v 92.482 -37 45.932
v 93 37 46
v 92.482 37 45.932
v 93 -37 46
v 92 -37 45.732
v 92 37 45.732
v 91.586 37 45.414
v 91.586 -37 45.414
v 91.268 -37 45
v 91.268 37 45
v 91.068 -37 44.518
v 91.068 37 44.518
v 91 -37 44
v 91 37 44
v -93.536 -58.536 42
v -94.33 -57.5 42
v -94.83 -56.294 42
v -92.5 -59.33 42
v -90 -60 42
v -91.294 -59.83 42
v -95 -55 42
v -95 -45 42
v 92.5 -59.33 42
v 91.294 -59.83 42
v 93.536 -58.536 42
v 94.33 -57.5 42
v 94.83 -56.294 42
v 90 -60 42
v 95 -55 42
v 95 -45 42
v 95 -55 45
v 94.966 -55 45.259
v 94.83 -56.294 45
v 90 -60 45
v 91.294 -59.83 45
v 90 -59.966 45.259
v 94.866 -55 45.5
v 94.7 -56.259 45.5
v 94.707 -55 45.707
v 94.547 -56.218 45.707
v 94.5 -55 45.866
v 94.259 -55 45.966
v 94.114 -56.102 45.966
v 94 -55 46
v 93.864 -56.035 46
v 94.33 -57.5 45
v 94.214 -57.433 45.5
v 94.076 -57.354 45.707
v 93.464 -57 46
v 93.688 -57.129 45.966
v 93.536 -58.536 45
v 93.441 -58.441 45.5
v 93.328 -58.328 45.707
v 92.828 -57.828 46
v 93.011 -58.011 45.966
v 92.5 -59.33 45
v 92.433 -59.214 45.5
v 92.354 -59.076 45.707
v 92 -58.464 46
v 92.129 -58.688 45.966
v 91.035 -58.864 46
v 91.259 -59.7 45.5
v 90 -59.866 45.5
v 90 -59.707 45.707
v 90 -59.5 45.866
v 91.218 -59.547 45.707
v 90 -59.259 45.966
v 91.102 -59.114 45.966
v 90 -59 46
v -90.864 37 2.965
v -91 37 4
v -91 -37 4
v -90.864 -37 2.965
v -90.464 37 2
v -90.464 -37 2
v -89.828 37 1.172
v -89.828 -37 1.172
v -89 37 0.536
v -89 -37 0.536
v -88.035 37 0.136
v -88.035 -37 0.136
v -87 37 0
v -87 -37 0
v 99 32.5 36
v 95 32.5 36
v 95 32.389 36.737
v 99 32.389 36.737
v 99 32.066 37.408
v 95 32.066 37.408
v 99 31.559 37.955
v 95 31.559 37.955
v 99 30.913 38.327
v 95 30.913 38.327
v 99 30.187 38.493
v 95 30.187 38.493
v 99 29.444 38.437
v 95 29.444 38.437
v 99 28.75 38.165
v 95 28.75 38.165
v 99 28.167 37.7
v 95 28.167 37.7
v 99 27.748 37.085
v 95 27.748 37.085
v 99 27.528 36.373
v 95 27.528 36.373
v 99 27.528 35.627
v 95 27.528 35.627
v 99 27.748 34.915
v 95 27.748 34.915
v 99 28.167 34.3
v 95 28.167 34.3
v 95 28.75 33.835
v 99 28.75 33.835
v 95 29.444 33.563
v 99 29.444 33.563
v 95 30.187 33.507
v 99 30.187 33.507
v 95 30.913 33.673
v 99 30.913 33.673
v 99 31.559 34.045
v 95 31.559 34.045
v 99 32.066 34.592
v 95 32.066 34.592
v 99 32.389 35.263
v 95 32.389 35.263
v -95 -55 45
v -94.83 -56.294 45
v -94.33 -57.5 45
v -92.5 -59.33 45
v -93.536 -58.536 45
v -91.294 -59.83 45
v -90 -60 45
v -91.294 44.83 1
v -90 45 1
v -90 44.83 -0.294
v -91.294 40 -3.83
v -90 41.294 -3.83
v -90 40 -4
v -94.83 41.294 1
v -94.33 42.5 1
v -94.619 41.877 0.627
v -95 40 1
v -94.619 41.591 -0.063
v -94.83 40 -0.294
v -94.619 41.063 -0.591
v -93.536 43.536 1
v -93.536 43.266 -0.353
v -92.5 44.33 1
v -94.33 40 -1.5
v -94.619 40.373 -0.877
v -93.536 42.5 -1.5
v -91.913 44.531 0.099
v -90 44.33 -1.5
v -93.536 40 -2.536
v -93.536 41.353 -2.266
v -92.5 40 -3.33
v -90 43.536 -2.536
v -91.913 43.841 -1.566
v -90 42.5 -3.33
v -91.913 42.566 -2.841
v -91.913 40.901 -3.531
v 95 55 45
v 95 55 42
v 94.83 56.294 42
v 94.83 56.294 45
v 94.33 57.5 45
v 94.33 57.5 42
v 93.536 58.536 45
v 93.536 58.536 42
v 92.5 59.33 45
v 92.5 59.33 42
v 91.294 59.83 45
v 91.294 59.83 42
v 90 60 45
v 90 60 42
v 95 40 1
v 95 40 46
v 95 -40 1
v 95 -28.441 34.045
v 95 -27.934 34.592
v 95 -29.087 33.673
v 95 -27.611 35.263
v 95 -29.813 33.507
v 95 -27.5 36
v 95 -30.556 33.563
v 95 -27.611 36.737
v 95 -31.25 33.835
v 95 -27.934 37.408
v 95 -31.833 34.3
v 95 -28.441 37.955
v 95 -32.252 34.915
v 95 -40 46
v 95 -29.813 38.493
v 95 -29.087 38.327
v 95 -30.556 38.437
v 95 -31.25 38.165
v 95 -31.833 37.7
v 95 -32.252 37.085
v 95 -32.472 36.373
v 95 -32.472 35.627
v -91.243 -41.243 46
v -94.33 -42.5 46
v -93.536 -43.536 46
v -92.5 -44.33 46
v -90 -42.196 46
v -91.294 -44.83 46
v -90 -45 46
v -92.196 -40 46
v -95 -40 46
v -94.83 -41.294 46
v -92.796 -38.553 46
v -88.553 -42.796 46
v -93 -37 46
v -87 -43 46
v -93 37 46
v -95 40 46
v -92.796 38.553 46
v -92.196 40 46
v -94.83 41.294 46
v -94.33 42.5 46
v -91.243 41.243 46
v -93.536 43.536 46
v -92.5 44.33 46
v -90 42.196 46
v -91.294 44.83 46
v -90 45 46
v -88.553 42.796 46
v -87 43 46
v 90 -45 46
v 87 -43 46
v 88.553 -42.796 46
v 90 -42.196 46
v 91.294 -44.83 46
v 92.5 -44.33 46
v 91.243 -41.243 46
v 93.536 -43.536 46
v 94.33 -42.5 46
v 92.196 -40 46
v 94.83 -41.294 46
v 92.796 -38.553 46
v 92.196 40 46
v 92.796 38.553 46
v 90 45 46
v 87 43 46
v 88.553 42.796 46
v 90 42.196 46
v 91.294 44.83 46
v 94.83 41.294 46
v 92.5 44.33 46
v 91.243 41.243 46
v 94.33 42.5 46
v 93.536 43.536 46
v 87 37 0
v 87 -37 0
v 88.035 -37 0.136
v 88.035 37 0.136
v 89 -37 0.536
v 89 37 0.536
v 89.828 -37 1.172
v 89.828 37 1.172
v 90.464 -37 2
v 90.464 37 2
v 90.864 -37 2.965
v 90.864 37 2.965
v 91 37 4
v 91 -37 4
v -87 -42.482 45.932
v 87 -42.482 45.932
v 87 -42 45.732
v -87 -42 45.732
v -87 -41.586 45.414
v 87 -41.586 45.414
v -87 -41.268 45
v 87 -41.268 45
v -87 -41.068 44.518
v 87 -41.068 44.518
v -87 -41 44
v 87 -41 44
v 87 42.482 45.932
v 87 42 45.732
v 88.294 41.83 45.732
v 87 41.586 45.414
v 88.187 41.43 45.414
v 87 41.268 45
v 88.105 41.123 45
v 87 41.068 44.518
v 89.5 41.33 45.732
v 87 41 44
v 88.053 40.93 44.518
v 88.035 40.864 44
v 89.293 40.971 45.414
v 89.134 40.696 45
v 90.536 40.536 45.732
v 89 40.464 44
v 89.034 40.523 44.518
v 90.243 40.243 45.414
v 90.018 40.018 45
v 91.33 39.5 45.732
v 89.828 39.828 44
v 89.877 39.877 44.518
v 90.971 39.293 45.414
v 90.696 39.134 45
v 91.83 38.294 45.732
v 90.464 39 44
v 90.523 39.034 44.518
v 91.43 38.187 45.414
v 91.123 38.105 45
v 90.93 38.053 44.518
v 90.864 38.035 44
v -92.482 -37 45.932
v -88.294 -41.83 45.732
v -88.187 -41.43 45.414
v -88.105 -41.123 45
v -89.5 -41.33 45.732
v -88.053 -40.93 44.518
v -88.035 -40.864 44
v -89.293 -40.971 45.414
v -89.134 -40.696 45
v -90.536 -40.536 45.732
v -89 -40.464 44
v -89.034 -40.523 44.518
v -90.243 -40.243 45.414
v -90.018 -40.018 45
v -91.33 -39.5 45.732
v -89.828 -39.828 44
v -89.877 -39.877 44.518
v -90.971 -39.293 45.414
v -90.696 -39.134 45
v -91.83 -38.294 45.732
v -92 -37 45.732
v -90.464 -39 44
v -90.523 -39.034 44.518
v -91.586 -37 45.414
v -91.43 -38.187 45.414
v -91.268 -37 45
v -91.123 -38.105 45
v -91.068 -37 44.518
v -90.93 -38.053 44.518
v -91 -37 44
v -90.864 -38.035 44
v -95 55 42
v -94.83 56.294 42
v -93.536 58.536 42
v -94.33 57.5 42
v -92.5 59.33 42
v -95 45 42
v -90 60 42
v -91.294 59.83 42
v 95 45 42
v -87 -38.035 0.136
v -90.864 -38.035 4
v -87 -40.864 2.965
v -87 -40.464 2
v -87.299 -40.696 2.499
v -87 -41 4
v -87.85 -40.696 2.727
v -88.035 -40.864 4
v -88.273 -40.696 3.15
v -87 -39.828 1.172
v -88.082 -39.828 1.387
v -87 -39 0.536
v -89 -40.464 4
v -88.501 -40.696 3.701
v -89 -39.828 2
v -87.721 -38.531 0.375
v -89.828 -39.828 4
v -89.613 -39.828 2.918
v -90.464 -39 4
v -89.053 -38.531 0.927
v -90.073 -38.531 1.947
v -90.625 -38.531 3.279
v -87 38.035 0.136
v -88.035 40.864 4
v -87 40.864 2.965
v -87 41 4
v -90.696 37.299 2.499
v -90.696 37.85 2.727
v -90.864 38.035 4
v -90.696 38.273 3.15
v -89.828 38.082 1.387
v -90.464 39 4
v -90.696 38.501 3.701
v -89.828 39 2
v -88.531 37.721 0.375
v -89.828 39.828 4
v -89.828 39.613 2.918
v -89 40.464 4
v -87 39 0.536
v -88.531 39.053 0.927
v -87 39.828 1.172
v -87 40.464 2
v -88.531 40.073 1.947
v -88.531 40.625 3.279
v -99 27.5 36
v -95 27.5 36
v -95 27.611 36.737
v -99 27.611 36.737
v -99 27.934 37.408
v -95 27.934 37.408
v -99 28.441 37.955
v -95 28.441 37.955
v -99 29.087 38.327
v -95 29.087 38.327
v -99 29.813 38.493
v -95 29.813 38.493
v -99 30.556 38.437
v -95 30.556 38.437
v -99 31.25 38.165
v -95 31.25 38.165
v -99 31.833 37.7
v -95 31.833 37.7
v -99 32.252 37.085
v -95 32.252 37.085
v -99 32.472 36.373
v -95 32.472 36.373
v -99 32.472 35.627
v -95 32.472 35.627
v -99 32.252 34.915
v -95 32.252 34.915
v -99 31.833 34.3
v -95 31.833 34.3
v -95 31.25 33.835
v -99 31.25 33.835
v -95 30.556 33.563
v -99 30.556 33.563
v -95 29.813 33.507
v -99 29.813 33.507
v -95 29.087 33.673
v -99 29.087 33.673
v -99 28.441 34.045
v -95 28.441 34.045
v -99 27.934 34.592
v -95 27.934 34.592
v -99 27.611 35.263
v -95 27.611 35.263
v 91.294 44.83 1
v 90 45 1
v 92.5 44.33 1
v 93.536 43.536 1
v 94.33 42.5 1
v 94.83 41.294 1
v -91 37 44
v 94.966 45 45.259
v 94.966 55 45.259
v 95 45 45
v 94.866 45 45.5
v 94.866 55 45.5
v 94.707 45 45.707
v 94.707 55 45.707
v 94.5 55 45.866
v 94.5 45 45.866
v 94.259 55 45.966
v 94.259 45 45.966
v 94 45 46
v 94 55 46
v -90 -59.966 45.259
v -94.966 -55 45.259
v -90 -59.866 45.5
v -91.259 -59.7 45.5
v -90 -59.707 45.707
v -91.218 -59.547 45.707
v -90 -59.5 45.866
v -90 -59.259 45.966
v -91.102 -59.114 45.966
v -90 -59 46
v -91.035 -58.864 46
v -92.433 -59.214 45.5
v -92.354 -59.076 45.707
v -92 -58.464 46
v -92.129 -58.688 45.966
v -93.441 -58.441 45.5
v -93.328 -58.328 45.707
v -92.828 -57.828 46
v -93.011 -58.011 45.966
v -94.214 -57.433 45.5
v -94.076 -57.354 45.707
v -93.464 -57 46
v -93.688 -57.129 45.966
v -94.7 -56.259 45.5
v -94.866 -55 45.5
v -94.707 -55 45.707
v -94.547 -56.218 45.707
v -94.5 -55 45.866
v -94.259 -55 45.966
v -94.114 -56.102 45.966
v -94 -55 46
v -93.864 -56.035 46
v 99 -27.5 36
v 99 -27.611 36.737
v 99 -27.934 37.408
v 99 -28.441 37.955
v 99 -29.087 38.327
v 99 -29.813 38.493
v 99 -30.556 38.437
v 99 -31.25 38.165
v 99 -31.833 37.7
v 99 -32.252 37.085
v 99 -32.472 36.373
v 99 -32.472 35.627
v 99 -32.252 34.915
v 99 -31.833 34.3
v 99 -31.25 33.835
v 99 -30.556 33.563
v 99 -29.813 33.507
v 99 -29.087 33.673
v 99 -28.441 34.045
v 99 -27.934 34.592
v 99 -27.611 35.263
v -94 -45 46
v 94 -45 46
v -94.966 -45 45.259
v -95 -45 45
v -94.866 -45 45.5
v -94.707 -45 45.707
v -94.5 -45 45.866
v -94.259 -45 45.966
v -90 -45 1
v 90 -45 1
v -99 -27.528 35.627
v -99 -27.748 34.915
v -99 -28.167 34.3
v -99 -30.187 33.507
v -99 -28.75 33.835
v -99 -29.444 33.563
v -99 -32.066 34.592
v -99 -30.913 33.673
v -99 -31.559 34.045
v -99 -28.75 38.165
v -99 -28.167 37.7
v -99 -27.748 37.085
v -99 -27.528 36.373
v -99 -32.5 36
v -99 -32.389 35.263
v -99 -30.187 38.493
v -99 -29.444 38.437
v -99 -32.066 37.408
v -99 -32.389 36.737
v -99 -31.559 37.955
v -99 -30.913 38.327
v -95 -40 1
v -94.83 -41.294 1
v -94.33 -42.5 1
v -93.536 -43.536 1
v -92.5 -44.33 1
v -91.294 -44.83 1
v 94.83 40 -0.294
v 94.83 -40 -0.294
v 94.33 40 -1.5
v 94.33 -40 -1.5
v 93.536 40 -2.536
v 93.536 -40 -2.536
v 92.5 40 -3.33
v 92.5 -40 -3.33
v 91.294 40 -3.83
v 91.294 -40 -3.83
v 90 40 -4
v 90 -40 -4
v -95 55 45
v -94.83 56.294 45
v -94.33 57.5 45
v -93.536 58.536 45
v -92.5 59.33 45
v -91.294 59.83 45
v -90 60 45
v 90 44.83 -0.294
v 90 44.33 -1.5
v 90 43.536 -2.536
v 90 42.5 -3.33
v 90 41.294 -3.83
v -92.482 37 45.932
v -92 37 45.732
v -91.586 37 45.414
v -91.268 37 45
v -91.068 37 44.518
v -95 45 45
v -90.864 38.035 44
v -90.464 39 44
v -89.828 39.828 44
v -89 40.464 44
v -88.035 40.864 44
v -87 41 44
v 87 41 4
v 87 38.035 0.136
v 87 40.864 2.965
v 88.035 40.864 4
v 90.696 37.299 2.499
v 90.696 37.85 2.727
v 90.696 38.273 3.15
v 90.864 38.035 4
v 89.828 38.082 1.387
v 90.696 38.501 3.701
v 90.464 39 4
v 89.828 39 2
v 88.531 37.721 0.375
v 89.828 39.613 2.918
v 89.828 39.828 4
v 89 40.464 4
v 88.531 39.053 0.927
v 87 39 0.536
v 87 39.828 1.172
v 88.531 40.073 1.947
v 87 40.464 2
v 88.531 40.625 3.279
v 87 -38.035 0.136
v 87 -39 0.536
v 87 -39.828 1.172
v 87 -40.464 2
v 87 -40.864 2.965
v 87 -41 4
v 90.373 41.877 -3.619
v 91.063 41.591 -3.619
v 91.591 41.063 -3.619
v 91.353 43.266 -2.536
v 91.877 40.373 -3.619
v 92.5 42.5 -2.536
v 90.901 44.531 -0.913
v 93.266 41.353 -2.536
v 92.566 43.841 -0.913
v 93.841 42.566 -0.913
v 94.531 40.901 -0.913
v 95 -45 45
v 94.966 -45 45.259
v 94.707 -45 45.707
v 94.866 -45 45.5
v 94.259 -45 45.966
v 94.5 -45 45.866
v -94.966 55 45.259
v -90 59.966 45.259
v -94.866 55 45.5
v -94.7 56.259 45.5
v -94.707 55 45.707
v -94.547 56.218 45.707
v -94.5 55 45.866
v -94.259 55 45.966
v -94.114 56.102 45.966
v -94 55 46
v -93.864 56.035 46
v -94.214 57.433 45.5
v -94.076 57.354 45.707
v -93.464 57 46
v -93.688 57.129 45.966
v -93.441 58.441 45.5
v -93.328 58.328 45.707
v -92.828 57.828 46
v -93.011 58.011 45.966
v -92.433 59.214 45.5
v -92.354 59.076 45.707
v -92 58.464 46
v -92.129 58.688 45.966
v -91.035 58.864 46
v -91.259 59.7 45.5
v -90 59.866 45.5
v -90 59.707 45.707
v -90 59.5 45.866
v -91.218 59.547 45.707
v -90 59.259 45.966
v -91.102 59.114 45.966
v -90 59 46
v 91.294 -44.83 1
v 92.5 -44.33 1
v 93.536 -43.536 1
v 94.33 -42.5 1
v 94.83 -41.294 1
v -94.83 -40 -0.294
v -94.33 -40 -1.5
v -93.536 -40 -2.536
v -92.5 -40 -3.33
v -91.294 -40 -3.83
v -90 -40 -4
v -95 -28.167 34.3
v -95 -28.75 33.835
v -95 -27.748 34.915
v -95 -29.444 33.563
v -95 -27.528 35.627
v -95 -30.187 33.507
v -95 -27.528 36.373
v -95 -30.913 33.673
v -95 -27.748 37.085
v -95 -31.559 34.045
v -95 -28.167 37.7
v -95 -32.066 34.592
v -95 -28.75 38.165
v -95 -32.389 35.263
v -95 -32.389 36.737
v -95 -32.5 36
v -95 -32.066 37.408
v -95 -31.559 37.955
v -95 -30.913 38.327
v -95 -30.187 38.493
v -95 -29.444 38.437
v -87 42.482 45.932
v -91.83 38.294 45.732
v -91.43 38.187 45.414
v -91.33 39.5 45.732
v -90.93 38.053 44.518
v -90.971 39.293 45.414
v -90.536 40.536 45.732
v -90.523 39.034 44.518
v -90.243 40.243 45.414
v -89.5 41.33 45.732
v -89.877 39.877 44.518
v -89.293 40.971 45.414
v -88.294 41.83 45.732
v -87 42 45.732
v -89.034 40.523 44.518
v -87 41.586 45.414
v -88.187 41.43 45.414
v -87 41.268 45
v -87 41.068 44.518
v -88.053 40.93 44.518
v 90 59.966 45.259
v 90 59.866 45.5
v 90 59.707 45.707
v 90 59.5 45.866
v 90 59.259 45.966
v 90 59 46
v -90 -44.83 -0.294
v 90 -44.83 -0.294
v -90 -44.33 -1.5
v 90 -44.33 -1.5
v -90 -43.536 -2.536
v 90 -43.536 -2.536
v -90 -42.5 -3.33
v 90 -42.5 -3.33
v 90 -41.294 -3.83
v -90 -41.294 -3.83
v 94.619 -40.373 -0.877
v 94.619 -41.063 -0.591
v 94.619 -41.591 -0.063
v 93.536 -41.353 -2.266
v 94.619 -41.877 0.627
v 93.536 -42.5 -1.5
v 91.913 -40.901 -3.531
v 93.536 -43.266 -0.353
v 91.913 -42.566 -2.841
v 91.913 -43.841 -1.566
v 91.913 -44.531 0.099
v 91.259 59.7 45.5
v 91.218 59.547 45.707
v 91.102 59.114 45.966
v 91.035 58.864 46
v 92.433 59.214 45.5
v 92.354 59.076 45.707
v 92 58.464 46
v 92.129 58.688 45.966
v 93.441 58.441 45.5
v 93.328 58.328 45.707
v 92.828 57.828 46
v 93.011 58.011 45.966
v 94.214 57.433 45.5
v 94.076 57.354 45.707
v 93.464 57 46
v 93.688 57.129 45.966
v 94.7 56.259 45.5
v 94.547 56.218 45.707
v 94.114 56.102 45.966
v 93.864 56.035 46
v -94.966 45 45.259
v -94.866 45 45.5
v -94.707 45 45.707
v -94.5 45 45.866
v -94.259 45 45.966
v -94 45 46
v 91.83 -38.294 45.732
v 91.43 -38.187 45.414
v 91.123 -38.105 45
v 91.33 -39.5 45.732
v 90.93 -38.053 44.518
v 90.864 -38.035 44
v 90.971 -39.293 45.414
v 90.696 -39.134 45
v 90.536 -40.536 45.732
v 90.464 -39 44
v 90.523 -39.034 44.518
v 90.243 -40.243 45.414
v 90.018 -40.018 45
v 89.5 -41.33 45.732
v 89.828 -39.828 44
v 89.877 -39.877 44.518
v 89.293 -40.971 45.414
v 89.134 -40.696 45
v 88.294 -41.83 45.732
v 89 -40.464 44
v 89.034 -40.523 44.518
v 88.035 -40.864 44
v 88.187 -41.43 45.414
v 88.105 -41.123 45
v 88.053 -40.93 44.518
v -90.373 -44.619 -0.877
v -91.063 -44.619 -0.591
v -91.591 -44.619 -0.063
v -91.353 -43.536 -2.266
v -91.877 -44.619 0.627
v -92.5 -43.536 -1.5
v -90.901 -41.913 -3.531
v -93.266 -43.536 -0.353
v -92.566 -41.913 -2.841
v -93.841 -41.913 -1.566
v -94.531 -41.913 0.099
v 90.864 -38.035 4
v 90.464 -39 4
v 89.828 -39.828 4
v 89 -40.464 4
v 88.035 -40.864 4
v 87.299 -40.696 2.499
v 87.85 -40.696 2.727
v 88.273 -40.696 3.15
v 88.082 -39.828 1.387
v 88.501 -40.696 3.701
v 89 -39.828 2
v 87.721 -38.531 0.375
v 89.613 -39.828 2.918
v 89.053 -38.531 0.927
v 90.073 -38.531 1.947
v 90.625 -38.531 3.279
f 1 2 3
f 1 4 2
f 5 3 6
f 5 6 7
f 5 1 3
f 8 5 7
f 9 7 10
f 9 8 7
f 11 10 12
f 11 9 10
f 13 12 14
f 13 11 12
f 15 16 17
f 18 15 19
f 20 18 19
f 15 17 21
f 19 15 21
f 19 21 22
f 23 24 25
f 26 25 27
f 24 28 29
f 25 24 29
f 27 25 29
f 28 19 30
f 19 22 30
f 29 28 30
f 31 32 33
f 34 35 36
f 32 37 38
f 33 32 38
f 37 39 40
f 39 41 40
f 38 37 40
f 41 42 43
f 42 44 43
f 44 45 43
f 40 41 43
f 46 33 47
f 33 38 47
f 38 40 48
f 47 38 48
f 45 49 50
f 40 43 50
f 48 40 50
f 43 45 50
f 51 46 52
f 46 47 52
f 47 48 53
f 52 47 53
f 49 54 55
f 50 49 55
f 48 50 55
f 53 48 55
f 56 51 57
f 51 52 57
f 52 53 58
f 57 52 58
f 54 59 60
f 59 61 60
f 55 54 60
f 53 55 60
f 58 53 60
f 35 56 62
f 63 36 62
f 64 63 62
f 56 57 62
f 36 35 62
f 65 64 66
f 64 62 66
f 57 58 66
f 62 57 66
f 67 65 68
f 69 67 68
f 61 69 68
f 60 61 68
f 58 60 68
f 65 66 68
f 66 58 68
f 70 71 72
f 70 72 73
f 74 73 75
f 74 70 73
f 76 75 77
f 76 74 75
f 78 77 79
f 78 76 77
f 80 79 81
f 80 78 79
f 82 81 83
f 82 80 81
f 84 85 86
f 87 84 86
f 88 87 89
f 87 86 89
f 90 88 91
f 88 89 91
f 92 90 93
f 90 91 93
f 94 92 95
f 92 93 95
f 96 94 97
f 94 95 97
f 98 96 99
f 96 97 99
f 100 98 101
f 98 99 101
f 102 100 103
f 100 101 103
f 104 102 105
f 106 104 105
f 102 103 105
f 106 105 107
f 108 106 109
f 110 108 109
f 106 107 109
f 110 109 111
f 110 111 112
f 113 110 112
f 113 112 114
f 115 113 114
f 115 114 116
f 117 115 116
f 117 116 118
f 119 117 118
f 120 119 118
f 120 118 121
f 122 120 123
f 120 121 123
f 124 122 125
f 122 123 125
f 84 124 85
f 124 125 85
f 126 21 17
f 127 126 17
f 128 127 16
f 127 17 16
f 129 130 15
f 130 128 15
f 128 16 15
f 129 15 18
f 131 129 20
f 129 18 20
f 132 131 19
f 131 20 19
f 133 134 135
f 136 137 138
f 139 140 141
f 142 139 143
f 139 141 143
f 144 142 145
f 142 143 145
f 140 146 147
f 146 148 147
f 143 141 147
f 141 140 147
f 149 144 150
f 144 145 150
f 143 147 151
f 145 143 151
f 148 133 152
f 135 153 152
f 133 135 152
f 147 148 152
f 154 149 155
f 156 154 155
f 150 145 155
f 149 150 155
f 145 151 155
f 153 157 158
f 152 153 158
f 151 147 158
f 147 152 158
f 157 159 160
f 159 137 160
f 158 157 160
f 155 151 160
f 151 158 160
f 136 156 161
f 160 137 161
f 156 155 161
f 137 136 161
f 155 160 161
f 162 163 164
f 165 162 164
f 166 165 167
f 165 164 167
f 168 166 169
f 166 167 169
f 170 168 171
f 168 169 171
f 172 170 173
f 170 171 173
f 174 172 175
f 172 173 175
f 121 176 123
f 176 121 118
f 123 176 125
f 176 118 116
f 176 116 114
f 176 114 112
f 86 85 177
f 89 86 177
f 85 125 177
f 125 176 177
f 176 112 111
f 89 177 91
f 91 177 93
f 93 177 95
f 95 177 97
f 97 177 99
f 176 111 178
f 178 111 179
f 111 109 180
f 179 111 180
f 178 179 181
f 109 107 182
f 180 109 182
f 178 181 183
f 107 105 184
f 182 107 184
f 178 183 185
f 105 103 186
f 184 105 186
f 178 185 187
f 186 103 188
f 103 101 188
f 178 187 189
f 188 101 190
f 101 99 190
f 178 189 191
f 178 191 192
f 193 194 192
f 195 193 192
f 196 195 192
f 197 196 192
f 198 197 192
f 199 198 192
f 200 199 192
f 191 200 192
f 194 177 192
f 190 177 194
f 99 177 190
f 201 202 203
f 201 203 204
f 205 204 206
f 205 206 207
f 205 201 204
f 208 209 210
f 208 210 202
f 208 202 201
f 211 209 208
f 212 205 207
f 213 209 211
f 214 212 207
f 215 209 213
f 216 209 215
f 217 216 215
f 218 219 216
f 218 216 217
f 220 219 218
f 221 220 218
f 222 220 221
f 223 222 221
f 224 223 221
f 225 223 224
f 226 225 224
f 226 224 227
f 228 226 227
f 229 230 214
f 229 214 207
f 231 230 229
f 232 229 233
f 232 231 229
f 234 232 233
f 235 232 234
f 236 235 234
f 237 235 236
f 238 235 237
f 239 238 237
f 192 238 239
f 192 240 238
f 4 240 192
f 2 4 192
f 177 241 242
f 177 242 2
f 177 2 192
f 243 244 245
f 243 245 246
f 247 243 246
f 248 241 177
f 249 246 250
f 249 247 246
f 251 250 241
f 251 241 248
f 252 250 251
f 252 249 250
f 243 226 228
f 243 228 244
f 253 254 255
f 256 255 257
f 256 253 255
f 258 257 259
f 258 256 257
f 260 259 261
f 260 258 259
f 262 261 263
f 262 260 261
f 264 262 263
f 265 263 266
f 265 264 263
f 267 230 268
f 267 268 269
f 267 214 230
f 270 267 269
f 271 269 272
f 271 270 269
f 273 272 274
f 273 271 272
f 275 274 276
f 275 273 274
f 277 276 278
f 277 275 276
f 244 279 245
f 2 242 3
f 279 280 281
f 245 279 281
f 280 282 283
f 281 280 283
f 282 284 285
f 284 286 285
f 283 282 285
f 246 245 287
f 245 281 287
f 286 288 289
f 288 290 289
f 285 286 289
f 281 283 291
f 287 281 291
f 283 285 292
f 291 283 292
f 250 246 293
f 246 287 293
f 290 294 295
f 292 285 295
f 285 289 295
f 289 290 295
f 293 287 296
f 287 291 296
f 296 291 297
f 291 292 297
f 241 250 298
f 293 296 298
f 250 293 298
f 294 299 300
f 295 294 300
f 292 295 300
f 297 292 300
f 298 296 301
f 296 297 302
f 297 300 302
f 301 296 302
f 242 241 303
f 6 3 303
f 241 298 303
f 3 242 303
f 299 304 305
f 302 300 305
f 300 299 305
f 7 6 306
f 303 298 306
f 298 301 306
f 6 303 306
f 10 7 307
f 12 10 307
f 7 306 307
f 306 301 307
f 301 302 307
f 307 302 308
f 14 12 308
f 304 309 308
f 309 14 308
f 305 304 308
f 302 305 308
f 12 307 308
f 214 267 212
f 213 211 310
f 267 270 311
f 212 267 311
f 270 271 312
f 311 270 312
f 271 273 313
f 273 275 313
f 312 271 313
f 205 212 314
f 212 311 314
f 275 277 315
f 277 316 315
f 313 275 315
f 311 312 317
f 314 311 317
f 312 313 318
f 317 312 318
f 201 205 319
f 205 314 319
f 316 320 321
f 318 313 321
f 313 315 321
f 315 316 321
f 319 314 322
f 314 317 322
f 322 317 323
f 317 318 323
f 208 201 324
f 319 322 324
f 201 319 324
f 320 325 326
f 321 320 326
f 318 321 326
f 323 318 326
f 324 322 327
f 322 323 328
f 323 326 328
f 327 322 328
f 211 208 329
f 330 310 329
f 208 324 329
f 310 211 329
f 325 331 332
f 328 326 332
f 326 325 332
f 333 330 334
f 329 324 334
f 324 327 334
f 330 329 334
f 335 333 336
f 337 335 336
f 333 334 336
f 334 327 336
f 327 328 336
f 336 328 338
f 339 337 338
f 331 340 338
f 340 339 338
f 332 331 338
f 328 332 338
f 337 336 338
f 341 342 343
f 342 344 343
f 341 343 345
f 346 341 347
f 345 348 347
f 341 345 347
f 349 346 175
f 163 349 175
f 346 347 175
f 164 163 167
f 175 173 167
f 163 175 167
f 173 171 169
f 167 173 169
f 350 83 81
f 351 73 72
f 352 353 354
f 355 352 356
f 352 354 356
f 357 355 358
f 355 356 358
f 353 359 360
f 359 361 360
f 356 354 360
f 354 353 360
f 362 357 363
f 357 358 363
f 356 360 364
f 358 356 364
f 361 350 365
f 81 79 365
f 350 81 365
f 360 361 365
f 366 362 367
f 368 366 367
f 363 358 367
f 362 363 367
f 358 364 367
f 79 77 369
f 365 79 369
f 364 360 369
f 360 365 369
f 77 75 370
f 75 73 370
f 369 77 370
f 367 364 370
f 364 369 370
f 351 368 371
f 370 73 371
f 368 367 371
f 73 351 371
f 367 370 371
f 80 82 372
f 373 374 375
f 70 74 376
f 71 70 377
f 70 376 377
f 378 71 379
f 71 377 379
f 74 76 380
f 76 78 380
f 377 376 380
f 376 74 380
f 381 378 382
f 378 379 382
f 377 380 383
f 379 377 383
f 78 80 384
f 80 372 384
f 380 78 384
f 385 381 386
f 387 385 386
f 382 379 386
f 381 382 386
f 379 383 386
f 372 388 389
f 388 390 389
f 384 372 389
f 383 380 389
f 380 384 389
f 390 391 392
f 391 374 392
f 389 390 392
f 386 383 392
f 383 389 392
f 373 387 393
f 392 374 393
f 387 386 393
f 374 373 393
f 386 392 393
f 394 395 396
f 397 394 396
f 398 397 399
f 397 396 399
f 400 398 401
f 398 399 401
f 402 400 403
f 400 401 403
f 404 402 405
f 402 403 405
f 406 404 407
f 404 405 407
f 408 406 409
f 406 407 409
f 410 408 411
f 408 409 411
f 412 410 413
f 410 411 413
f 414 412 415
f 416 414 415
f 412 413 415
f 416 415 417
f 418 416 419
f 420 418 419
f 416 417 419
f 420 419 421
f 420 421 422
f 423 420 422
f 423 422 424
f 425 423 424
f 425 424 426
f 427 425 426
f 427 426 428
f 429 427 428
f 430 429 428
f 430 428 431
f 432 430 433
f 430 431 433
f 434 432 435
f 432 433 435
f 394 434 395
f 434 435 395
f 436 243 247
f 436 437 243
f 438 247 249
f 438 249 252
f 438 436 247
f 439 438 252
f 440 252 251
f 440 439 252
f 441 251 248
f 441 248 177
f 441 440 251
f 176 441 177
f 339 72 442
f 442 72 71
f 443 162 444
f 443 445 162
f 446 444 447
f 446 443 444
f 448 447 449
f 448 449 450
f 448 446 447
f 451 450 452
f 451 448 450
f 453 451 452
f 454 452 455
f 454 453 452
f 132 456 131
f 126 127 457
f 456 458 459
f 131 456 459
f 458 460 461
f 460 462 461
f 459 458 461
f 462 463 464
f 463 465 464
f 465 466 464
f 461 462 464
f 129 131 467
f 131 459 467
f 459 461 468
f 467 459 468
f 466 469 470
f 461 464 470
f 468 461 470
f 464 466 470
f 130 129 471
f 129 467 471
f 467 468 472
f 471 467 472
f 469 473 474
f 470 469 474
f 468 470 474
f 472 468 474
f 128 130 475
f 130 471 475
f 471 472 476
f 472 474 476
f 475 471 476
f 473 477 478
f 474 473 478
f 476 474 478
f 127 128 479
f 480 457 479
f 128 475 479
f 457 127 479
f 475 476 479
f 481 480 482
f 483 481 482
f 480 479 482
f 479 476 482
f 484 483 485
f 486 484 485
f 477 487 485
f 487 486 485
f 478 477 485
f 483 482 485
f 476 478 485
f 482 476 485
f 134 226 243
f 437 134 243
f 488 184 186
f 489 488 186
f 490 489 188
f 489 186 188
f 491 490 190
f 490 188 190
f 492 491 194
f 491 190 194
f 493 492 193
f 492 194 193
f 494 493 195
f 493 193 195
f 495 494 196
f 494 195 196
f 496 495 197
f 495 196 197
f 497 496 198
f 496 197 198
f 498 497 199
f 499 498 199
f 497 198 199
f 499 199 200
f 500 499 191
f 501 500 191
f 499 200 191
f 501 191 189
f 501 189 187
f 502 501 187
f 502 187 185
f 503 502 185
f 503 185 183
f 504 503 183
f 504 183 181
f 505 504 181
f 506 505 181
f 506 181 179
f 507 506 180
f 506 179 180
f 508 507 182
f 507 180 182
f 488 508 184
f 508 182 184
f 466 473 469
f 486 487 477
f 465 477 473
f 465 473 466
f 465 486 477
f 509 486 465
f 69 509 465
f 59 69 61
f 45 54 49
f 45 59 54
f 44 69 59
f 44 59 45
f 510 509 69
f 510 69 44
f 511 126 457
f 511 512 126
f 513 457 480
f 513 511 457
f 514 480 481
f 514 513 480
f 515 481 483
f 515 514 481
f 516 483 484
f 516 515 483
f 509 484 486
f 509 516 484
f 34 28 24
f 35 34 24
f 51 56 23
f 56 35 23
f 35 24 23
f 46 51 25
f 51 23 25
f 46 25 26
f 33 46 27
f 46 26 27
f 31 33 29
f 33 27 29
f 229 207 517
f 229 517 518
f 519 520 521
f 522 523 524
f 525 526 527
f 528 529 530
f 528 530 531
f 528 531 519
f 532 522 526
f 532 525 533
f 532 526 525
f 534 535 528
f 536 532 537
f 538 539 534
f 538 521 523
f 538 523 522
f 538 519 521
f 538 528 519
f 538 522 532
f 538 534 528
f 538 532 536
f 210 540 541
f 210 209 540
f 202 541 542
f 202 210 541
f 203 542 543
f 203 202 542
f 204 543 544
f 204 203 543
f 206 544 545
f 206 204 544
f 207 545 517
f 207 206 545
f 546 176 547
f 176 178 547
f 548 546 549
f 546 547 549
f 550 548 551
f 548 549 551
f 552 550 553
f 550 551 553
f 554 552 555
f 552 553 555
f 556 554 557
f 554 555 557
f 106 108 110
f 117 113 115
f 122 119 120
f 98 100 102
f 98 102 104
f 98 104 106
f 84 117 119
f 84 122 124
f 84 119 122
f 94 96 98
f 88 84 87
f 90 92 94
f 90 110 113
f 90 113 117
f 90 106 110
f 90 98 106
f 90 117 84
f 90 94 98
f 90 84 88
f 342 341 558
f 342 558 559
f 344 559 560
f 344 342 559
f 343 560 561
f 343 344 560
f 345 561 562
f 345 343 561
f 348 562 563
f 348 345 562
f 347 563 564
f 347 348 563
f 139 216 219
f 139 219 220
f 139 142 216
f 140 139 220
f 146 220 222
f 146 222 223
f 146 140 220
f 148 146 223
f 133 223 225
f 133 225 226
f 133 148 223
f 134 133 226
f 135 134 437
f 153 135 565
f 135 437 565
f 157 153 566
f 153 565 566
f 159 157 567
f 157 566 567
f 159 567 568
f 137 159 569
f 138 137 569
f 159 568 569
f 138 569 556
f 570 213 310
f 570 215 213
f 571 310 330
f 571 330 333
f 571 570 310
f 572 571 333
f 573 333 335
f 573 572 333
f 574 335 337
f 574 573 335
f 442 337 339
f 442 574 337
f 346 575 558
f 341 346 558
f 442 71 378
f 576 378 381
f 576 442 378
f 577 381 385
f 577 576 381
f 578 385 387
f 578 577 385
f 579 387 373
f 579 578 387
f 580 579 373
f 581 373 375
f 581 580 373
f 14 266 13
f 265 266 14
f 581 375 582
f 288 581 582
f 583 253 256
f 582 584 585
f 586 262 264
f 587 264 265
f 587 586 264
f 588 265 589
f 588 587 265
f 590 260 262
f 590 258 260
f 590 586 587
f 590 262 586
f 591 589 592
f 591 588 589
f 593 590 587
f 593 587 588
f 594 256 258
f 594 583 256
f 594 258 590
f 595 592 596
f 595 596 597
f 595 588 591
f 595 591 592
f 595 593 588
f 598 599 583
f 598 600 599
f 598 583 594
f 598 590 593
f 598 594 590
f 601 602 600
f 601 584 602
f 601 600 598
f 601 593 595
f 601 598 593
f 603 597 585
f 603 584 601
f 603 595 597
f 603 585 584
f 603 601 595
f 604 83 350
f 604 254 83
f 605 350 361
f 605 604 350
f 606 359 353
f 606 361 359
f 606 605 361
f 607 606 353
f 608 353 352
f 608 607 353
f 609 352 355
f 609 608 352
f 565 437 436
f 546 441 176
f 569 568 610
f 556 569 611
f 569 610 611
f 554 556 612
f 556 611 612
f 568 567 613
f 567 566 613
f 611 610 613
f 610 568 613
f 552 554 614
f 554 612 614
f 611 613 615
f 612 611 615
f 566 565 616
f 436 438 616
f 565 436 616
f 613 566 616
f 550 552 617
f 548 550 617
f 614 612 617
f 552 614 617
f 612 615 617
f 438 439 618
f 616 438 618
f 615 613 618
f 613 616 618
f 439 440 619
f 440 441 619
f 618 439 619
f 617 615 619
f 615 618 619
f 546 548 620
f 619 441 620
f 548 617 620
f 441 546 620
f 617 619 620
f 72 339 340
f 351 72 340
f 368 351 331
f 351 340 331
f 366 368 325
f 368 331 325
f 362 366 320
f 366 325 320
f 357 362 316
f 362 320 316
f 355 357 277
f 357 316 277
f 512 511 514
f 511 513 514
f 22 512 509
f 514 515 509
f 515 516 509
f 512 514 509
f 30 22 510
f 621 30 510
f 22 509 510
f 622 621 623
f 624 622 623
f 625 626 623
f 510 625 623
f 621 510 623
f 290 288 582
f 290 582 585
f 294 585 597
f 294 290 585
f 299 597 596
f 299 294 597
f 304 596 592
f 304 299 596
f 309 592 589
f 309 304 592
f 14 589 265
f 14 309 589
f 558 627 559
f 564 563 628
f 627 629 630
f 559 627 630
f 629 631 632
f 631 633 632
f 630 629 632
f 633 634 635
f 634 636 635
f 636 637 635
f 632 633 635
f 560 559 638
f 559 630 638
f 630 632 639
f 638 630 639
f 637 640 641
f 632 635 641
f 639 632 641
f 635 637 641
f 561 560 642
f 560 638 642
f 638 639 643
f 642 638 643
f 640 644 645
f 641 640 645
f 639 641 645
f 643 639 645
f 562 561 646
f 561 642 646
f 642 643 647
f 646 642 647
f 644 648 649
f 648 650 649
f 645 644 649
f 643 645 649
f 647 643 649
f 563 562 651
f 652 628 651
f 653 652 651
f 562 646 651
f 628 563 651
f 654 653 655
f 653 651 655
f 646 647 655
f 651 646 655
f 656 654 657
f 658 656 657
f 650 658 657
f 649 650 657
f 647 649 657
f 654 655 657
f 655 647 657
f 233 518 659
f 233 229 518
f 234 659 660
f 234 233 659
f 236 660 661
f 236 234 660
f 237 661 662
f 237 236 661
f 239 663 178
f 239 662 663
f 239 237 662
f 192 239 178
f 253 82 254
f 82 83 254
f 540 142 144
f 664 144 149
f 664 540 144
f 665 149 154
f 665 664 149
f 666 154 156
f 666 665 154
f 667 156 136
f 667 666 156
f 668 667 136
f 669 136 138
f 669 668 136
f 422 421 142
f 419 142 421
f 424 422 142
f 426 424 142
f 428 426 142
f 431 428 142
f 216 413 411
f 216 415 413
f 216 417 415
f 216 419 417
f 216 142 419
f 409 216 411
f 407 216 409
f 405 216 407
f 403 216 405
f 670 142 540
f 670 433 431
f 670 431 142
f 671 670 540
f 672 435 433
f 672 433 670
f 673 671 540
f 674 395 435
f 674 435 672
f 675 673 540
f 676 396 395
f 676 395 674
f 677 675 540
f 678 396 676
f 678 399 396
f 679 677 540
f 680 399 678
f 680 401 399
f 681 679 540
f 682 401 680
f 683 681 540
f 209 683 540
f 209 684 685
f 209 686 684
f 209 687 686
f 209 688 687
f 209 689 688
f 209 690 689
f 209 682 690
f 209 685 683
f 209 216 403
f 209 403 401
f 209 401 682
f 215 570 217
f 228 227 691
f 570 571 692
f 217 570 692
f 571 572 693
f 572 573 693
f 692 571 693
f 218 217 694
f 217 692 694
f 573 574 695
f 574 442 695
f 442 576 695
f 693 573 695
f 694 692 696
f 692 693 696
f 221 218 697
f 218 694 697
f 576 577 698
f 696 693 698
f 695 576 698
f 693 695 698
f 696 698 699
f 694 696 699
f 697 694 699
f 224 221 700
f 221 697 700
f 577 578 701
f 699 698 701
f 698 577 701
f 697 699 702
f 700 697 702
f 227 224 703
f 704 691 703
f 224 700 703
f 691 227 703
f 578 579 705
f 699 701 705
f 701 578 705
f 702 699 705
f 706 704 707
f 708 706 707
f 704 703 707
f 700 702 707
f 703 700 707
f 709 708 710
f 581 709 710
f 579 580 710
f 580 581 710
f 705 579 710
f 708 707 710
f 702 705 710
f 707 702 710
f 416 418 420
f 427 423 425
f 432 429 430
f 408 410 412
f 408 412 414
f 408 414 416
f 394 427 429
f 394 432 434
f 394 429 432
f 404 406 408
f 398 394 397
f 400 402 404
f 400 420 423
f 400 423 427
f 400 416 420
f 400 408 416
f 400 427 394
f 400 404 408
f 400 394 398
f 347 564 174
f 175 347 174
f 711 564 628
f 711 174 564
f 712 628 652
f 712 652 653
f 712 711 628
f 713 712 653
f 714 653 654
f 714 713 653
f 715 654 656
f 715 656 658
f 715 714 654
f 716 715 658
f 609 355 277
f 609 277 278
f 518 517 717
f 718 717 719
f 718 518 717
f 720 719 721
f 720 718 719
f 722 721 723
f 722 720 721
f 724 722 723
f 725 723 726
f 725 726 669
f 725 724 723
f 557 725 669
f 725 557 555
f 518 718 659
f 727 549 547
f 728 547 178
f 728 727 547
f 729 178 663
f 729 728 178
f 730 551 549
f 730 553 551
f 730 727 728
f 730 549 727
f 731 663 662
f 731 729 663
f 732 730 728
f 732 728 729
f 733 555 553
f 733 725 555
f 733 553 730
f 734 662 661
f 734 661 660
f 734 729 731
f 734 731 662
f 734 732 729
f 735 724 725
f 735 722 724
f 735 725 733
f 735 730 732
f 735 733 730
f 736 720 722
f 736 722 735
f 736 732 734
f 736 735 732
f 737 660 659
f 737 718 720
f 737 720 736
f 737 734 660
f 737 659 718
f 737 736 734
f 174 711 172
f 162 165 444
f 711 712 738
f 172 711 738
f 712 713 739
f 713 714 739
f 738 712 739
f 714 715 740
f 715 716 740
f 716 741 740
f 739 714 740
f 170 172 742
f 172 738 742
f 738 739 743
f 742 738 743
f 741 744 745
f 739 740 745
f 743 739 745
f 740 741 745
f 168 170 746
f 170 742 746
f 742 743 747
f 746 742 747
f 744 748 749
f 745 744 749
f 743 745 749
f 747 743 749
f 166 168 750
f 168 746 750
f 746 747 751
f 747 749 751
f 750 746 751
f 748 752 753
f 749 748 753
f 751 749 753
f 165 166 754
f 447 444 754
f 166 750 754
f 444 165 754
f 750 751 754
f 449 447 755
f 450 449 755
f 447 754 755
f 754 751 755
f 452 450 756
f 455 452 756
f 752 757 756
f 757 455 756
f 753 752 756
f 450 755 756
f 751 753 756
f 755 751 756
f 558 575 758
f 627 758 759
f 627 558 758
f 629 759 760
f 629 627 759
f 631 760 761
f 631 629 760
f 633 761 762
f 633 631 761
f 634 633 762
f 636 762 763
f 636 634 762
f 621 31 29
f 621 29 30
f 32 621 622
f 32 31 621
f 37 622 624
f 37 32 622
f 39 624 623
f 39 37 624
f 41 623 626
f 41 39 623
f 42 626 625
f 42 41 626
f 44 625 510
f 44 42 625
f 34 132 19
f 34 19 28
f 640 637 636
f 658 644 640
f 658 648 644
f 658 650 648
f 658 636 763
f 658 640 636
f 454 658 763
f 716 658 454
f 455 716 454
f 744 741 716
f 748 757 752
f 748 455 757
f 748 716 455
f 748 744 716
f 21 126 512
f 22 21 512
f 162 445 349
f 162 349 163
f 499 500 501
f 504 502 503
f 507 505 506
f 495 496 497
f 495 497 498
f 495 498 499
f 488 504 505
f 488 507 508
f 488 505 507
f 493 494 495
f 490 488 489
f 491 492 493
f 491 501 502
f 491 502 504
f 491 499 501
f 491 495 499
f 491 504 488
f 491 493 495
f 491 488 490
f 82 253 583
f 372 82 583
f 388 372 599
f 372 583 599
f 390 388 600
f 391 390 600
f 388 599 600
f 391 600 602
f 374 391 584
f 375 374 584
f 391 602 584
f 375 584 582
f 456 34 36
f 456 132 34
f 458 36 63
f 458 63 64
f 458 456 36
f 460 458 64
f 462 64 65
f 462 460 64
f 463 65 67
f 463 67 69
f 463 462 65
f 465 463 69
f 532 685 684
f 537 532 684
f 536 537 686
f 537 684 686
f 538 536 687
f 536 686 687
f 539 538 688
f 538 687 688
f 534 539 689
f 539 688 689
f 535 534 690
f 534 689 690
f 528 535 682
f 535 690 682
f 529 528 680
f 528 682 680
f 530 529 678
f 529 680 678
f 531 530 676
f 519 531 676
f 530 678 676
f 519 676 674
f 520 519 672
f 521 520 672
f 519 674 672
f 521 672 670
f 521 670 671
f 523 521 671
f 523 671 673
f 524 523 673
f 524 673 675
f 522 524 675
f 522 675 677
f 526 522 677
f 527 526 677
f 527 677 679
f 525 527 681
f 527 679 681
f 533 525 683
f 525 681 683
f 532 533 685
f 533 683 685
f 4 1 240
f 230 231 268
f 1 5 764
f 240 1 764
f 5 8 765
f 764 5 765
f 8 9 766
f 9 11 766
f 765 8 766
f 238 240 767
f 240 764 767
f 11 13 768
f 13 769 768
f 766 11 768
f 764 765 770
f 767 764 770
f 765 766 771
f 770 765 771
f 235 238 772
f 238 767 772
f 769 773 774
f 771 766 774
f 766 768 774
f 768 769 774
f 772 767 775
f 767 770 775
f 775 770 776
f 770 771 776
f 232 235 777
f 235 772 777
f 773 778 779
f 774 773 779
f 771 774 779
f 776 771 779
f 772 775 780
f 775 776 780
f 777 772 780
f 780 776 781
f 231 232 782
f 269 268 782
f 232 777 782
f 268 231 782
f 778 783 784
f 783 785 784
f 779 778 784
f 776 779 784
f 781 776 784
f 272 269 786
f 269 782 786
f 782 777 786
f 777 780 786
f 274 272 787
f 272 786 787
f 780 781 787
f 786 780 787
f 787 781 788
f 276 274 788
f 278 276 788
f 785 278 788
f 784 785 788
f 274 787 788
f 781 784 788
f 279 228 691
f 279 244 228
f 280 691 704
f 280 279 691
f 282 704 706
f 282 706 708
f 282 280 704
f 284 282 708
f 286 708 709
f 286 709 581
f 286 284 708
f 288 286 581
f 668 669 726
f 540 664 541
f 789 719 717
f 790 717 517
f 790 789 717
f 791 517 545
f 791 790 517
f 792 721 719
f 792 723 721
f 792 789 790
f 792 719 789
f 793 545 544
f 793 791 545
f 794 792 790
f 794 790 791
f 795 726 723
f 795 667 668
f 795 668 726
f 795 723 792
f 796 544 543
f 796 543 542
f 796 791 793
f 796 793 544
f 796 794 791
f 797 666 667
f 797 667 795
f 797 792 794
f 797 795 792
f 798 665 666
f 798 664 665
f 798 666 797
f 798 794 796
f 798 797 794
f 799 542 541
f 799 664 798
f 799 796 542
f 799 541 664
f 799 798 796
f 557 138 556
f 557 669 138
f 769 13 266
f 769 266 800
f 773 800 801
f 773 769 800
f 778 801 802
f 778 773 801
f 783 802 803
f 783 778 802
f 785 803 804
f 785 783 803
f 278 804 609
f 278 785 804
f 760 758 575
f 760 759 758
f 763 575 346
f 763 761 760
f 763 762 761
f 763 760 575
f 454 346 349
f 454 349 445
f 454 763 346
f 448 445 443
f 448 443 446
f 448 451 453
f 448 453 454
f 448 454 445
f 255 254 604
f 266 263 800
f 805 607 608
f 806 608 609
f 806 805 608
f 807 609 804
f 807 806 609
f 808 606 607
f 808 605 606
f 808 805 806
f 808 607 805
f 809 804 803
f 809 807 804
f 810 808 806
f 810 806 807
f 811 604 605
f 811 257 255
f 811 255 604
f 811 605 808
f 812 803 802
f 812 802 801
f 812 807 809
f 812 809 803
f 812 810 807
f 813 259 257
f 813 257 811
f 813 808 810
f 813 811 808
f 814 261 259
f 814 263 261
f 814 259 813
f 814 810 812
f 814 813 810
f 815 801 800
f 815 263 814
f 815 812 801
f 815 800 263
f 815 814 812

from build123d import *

# Parameters (mm, degrees)
F0_W      = 190
F0_H      = 90
F0_W_2    = 182
F0_H_2    = 82
F1_DEPTH  = 46
F2_W      = 190
F2_H      = 90
F2_W_2    = 182
F2_H_2    = 82
F3_DEPTH  = 4
F4_R      = 4
F5_W      = 190
F5_H      = 15
F6_DEPTH  = 4
F7_R      = 5
F7_2_R    = 5
F8_R      = 2
F9_R      = 1
F9_2_R    = 1
F10_R     = 5
F11_R     = 2.5
F12_DEPTH = 4
F13_R     = 2.5
F14_DEPTH = 4


with BuildPart() as f1:
    # F0 (on Top) → F1 (new body)
    with BuildSketch(Plane.XY):
        Rectangle(F0_W, F0_H)
        Rectangle(F0_W_2, F0_H_2, mode=Mode.SUBTRACT)
    extrude(amount=F1_DEPTH)

    # F2 (on face) → F3 (join)
    with BuildSketch(Plane(origin=(0, 0, 0), x_dir=(1, 0, 0), z_dir=(0, 0, -1))):
        Rectangle(F2_W, F2_H)
        Rectangle(F2_W_2, F2_H_2, mode=Mode.SUBTRACT)
        Rectangle(F2_W_2, F2_H_2)
    extrude(amount=F3_DEPTH)

    # F4
    f4_edges = [f1.edges().sort_by_distance(p)[0] for p in [
        (0, 41, 0),
        (-91, 0, 0),
        (91, 0, 0),
        (0, -41, 0),
        (91, -41, 23),
        (91, 41, 23),
        (-91, 41, 23),
        (-91, -41, 23),
    ]]
    fillet(f4_edges, radius=F4_R)

    # F8
    f8_edges = [f1.edges().sort_by_distance(p)[0] for p in [
        (0, 41, 46),
        (89.828427, 39.828427, 46),
    ]]
    fillet(f8_edges, radius=F8_R)

    # F10
    f10_edges = [f1.edges().sort_by_distance(p)[0] for p in [
        (95, 45, 21),
        (0, 45, -4),
        (-95, 45, 21),
        (-95, 0, -4),
        (0, -45, -4),
        (95, 0, -4),
        (95, -45, 21),
        (-95, -45, 21),
    ]]
    fillet(f10_edges, radius=F10_R)

    # F11 (on face) → F12 (join)
    with BuildSketch(Plane(origin=(-95, 0, 0), x_dir=(0, -1, 0), z_dir=(-1, 0, 0))):
        with Locations((-30, 36)):
            Circle(F11_R)
        with Locations((30, 36)):
            Circle(F11_R)
    extrude(amount=F12_DEPTH)

    # F13 (on face) → F14 (join)
    with BuildSketch(Plane.YZ.offset(95)):
        with Locations((-30, 36)):
            Circle(F13_R)
        with Locations((30, 36)):
            Circle(F13_R)
    extrude(amount=F14_DEPTH)


with BuildPart() as f6:
    # F5 (on face) → F6 (new body)
    with BuildSketch(Plane.XY.offset(46)):
        with Locations((0, -52.5)):
            Rectangle(F5_W, F5_H)
    extrude(amount=-F6_DEPTH)

    # F7
    f7_edges = [f6.edges().sort_by_distance(p)[0] for p in [
        (-95, -60, 44),
        (95, -60, 44),
    ]]
    fillet(f7_edges, radius=F7_R)

    # F9#2
    f9_2_edges = [f6.edges().sort_by_distance(p)[0] for p in [
        (-95, -50, 46),
    ]]
    fillet(f9_2_edges, radius=F9_2_R)


with BuildPart() as f6b:
    # F5 (on face) → F6, piece 2 (new body)
    with BuildSketch(Plane.XY.offset(46)):
        with Locations((0, 52.5)):
            Rectangle(F5_W, F5_H)
    extrude(amount=-F6_DEPTH)

    # F7#2
    f7_2_edges = [f6b.edges().sort_by_distance(p)[0] for p in [
        (95, 60, 44),
        (-95, 60, 44),
    ]]
    fillet(f7_2_edges, radius=F7_2_R)

    # F9
    f9_edges = [f6b.edges().sort_by_distance(p)[0] for p in [
        (-95, 50, 46),
    ]]
    fillet(f9_edges, radius=F9_R)


solid = Compound([f1.part, f6.part, f6b.part])
